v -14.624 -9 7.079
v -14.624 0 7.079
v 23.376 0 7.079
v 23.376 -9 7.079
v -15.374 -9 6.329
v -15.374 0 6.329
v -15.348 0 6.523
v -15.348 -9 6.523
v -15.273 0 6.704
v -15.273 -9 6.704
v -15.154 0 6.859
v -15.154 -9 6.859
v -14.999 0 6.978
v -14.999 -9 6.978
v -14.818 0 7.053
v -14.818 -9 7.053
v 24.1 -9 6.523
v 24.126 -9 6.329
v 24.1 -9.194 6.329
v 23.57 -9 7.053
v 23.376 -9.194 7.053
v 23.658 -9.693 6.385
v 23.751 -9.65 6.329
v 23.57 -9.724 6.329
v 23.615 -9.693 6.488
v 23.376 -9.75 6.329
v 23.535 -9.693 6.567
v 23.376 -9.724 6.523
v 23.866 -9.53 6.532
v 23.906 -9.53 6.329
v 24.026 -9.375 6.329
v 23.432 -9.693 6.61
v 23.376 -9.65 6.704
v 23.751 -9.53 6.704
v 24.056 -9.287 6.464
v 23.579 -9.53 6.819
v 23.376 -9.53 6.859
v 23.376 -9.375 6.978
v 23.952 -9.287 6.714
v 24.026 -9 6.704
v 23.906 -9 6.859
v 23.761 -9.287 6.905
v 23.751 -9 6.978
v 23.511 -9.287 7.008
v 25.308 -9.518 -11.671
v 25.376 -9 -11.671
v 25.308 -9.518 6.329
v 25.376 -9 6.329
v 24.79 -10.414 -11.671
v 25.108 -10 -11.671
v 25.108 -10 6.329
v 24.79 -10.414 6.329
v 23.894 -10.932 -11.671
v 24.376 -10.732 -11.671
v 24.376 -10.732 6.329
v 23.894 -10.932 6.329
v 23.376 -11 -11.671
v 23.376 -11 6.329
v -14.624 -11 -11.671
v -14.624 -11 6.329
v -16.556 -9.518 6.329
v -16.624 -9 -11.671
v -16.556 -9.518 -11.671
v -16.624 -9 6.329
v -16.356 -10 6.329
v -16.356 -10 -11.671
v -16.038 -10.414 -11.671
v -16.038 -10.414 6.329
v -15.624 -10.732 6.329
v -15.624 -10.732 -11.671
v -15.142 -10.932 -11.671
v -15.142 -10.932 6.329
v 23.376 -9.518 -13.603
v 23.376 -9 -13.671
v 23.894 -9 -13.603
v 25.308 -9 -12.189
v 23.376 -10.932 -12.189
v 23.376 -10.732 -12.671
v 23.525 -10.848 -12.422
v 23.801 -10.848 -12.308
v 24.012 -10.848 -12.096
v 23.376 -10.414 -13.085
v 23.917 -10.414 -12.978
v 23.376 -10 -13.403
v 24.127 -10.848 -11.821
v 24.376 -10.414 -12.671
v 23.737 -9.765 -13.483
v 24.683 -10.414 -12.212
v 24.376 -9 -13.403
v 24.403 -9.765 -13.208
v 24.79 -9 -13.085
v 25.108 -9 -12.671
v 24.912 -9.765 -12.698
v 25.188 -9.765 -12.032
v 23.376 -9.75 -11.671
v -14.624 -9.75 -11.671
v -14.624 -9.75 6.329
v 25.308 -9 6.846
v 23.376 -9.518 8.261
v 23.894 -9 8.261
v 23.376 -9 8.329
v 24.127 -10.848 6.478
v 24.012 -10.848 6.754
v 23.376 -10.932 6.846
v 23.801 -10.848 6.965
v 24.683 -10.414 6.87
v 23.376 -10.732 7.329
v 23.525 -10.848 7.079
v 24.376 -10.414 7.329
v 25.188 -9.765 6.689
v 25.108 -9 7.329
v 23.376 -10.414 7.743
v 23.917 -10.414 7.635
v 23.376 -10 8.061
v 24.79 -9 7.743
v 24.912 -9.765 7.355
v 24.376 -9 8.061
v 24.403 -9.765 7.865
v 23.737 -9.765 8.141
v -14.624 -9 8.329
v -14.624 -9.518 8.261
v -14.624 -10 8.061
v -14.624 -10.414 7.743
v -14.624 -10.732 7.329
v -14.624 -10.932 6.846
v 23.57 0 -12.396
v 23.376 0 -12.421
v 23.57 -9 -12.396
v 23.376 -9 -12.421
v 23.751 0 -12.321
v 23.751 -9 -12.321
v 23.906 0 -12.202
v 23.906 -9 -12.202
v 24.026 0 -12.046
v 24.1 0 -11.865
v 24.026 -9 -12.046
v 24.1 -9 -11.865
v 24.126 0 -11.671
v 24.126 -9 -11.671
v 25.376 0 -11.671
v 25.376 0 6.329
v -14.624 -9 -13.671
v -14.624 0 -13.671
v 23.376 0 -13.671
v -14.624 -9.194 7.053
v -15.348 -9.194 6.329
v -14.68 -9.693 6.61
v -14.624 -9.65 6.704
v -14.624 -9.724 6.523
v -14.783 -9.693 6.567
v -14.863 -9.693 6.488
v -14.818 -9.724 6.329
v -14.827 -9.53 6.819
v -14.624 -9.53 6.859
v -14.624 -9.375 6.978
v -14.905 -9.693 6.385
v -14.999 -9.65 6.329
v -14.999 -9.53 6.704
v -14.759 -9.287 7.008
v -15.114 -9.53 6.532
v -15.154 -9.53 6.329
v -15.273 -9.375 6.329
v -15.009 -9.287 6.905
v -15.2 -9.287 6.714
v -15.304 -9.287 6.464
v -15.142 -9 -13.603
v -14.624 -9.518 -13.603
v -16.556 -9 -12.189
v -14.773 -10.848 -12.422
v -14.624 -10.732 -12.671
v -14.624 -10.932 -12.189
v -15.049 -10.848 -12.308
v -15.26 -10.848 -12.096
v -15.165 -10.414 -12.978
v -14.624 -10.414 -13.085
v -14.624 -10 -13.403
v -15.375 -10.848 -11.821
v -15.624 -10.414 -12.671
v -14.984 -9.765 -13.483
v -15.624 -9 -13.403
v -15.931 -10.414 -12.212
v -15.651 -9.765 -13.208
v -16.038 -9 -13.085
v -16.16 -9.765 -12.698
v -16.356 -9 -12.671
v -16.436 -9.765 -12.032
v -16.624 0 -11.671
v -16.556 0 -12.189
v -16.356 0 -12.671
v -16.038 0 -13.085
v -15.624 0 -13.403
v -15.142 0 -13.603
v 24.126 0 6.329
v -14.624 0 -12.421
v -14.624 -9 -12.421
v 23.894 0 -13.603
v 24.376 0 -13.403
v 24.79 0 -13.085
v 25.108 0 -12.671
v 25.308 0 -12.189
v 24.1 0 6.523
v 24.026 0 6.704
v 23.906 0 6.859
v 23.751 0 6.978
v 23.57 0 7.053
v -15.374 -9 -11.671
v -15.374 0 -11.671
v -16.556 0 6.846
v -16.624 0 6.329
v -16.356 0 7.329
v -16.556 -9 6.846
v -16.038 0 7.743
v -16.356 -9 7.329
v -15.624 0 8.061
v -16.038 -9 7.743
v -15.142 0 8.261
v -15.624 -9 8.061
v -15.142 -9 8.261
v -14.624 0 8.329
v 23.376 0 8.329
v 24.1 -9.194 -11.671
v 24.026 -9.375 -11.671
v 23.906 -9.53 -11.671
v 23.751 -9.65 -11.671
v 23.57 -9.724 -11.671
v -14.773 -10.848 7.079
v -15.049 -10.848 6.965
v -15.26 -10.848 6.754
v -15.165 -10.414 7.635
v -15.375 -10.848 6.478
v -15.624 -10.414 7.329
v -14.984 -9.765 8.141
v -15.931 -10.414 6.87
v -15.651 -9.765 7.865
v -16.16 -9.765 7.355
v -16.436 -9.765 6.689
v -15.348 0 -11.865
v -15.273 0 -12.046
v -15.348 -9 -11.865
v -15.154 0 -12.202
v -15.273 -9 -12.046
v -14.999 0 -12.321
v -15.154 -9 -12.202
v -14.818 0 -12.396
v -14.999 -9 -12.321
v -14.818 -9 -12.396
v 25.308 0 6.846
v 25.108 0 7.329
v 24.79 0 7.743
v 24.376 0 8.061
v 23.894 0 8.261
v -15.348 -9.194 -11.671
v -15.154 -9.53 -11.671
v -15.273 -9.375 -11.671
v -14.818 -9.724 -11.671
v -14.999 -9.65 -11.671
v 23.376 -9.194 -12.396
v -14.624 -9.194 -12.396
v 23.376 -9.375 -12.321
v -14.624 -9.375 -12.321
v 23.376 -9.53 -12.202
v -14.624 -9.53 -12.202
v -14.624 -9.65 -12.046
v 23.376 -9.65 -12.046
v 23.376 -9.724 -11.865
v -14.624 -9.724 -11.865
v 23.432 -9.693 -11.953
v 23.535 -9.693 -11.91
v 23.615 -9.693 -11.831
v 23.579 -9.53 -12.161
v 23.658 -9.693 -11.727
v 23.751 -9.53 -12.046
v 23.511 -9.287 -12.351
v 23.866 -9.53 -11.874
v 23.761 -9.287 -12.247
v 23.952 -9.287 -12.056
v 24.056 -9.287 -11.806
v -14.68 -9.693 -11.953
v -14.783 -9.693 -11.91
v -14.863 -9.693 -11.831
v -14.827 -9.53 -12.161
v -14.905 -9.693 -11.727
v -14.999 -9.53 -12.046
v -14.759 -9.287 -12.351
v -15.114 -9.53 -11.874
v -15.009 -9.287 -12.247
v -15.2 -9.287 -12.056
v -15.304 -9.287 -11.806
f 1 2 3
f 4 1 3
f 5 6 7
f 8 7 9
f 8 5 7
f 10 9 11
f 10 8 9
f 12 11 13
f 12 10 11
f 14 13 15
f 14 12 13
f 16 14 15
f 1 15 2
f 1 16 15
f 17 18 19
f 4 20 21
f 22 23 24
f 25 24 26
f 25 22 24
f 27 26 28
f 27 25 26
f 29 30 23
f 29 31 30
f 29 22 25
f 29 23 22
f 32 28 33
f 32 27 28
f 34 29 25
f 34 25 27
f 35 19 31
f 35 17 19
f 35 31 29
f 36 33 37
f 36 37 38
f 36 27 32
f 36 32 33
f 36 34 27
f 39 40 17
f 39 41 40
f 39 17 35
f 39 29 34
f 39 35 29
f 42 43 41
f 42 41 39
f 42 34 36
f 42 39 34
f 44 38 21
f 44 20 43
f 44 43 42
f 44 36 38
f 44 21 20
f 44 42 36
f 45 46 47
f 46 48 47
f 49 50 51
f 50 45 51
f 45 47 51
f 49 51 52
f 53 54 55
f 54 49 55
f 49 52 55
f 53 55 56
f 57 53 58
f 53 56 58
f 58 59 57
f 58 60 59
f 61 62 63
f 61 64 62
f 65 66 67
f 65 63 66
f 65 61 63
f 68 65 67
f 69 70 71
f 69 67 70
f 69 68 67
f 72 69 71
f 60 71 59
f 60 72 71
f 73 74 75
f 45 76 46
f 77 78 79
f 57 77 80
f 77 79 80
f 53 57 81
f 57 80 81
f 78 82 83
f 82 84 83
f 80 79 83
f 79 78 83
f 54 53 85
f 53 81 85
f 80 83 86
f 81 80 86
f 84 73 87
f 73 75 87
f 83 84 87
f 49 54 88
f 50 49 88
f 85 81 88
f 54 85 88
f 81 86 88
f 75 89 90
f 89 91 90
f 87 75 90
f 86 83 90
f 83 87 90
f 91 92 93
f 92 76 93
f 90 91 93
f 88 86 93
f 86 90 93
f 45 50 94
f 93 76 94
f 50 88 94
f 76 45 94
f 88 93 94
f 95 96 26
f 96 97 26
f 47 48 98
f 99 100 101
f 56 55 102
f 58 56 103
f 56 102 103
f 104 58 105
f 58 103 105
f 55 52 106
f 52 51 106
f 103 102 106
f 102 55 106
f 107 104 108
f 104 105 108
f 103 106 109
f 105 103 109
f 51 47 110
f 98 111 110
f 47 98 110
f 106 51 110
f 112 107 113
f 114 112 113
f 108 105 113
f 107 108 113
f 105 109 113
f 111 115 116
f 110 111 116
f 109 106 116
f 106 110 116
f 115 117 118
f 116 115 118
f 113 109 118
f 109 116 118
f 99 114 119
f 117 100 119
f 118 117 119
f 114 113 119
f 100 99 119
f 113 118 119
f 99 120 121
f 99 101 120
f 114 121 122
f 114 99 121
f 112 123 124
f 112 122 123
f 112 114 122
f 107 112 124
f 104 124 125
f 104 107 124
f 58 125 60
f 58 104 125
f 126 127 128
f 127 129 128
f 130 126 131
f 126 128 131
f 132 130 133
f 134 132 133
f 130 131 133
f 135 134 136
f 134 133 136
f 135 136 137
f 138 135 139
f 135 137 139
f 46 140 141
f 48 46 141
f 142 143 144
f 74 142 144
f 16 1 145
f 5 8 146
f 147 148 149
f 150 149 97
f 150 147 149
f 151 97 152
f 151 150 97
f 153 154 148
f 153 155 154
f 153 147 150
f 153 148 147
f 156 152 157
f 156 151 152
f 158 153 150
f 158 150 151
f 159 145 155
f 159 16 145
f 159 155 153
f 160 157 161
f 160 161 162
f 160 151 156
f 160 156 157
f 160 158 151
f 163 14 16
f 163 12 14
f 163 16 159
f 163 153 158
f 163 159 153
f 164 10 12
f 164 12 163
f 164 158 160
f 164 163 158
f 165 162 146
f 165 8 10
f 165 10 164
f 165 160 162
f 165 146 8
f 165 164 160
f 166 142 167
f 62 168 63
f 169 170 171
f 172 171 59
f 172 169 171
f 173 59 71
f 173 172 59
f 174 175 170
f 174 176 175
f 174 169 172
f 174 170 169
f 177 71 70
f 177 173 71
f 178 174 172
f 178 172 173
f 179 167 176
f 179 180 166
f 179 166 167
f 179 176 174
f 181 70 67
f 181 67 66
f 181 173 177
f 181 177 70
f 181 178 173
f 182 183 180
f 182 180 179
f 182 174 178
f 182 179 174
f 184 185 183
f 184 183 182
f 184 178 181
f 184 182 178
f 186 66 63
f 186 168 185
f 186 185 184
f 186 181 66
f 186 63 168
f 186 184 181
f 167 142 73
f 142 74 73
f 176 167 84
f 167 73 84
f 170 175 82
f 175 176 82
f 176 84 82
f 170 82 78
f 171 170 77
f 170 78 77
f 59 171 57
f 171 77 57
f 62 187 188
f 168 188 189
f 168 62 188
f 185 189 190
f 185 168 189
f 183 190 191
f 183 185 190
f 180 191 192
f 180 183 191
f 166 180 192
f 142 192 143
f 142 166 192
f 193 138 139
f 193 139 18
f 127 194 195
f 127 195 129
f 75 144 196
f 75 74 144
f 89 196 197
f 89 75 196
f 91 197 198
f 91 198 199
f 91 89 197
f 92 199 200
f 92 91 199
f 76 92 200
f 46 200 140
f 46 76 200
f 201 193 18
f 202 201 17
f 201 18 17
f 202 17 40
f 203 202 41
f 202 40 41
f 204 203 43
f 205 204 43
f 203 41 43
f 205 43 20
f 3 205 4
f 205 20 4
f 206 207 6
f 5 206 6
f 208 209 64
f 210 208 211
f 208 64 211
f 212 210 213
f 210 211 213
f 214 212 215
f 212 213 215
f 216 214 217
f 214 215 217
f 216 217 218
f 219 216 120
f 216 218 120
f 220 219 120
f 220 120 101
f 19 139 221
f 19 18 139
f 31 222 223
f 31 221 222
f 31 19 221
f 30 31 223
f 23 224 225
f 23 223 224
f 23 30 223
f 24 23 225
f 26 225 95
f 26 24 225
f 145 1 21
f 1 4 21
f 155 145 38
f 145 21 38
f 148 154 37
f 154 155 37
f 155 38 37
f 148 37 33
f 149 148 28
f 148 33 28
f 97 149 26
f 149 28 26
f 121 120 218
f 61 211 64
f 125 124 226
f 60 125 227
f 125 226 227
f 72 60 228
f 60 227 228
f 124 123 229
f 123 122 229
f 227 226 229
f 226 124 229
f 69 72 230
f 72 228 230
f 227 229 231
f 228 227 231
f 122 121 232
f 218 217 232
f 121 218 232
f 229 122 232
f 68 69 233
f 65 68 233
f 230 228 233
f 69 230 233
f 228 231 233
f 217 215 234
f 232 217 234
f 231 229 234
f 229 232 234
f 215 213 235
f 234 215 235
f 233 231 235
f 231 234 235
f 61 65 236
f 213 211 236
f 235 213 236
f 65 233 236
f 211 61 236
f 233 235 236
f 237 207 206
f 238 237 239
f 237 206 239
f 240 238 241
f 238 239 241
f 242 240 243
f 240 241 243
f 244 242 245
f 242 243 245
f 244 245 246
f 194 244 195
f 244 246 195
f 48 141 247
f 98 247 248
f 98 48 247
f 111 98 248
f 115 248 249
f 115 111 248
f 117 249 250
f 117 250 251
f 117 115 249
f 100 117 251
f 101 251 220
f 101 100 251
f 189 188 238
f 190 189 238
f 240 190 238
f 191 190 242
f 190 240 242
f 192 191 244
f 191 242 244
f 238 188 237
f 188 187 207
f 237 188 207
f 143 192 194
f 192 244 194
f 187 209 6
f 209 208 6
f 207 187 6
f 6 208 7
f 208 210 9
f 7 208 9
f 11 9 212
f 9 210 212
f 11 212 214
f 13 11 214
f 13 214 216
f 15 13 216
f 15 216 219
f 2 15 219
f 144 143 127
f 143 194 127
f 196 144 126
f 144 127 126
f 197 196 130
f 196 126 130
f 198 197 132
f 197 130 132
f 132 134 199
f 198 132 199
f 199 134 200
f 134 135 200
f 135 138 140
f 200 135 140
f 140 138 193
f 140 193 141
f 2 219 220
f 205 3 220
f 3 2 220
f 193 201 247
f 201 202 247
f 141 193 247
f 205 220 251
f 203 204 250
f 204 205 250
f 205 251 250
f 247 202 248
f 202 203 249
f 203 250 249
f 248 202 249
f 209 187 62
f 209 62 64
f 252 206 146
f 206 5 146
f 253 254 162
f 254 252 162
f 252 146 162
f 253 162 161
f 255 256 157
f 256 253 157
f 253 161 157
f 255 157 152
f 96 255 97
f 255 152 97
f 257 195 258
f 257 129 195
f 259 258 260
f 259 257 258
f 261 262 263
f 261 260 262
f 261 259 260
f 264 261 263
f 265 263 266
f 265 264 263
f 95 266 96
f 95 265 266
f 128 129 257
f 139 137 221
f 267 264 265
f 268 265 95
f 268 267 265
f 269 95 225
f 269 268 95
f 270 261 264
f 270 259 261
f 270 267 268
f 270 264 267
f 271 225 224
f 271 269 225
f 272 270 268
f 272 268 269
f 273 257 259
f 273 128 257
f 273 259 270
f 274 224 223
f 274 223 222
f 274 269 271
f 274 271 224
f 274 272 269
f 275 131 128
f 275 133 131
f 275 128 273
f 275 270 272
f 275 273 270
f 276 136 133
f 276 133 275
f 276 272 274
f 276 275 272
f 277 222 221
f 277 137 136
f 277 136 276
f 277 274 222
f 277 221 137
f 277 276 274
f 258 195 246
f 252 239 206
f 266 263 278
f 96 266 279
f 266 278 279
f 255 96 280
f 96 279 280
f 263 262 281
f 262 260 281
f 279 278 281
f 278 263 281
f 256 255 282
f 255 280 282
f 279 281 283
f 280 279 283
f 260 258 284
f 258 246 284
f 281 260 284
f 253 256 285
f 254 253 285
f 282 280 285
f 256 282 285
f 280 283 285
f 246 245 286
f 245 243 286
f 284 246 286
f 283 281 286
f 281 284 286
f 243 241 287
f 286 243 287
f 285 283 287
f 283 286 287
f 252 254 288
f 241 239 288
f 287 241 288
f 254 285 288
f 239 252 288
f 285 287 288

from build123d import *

# Parameters (mm, degrees)
F0_W     = 42
F0_H     = 22
F1_DEPTH = 11
F2_R     = 2
F3_T     = -1.25


with BuildPart() as f1:
    # F0 (on Front) → F1 (new body)
    with BuildSketch(Plane.XZ):
        with Locations((4.376042, -2.671225)):
            Rectangle(F0_W, F0_H)
    extrude(amount=F1_DEPTH)

    # F2
    f2_edges = [f1.edges().sort_by_distance(p)[0] for p in [
        (25.376042, -5.5, 8.328775),
        (25.376042, -5.5, -13.671225),
        (-16.623958, -5.5, 8.328775),
        (-16.623958, -5.5, -13.671225),
        (4.376042, -11, -13.671225),
        (25.376042, -11, -2.671225),
        (4.376042, -11, 8.328775),
        (-16.623958, -11, -2.671225),
    ]]
    fillet(f2_edges, radius=F2_R)

    # F3
    f3_openings = [f1.faces().sort_by_distance(p)[0] for p in [
        (4.376042, 0, -2.671225),
    ]]
    offset(amount=F3_T, openings=f3_openings)


solid = f1.part
